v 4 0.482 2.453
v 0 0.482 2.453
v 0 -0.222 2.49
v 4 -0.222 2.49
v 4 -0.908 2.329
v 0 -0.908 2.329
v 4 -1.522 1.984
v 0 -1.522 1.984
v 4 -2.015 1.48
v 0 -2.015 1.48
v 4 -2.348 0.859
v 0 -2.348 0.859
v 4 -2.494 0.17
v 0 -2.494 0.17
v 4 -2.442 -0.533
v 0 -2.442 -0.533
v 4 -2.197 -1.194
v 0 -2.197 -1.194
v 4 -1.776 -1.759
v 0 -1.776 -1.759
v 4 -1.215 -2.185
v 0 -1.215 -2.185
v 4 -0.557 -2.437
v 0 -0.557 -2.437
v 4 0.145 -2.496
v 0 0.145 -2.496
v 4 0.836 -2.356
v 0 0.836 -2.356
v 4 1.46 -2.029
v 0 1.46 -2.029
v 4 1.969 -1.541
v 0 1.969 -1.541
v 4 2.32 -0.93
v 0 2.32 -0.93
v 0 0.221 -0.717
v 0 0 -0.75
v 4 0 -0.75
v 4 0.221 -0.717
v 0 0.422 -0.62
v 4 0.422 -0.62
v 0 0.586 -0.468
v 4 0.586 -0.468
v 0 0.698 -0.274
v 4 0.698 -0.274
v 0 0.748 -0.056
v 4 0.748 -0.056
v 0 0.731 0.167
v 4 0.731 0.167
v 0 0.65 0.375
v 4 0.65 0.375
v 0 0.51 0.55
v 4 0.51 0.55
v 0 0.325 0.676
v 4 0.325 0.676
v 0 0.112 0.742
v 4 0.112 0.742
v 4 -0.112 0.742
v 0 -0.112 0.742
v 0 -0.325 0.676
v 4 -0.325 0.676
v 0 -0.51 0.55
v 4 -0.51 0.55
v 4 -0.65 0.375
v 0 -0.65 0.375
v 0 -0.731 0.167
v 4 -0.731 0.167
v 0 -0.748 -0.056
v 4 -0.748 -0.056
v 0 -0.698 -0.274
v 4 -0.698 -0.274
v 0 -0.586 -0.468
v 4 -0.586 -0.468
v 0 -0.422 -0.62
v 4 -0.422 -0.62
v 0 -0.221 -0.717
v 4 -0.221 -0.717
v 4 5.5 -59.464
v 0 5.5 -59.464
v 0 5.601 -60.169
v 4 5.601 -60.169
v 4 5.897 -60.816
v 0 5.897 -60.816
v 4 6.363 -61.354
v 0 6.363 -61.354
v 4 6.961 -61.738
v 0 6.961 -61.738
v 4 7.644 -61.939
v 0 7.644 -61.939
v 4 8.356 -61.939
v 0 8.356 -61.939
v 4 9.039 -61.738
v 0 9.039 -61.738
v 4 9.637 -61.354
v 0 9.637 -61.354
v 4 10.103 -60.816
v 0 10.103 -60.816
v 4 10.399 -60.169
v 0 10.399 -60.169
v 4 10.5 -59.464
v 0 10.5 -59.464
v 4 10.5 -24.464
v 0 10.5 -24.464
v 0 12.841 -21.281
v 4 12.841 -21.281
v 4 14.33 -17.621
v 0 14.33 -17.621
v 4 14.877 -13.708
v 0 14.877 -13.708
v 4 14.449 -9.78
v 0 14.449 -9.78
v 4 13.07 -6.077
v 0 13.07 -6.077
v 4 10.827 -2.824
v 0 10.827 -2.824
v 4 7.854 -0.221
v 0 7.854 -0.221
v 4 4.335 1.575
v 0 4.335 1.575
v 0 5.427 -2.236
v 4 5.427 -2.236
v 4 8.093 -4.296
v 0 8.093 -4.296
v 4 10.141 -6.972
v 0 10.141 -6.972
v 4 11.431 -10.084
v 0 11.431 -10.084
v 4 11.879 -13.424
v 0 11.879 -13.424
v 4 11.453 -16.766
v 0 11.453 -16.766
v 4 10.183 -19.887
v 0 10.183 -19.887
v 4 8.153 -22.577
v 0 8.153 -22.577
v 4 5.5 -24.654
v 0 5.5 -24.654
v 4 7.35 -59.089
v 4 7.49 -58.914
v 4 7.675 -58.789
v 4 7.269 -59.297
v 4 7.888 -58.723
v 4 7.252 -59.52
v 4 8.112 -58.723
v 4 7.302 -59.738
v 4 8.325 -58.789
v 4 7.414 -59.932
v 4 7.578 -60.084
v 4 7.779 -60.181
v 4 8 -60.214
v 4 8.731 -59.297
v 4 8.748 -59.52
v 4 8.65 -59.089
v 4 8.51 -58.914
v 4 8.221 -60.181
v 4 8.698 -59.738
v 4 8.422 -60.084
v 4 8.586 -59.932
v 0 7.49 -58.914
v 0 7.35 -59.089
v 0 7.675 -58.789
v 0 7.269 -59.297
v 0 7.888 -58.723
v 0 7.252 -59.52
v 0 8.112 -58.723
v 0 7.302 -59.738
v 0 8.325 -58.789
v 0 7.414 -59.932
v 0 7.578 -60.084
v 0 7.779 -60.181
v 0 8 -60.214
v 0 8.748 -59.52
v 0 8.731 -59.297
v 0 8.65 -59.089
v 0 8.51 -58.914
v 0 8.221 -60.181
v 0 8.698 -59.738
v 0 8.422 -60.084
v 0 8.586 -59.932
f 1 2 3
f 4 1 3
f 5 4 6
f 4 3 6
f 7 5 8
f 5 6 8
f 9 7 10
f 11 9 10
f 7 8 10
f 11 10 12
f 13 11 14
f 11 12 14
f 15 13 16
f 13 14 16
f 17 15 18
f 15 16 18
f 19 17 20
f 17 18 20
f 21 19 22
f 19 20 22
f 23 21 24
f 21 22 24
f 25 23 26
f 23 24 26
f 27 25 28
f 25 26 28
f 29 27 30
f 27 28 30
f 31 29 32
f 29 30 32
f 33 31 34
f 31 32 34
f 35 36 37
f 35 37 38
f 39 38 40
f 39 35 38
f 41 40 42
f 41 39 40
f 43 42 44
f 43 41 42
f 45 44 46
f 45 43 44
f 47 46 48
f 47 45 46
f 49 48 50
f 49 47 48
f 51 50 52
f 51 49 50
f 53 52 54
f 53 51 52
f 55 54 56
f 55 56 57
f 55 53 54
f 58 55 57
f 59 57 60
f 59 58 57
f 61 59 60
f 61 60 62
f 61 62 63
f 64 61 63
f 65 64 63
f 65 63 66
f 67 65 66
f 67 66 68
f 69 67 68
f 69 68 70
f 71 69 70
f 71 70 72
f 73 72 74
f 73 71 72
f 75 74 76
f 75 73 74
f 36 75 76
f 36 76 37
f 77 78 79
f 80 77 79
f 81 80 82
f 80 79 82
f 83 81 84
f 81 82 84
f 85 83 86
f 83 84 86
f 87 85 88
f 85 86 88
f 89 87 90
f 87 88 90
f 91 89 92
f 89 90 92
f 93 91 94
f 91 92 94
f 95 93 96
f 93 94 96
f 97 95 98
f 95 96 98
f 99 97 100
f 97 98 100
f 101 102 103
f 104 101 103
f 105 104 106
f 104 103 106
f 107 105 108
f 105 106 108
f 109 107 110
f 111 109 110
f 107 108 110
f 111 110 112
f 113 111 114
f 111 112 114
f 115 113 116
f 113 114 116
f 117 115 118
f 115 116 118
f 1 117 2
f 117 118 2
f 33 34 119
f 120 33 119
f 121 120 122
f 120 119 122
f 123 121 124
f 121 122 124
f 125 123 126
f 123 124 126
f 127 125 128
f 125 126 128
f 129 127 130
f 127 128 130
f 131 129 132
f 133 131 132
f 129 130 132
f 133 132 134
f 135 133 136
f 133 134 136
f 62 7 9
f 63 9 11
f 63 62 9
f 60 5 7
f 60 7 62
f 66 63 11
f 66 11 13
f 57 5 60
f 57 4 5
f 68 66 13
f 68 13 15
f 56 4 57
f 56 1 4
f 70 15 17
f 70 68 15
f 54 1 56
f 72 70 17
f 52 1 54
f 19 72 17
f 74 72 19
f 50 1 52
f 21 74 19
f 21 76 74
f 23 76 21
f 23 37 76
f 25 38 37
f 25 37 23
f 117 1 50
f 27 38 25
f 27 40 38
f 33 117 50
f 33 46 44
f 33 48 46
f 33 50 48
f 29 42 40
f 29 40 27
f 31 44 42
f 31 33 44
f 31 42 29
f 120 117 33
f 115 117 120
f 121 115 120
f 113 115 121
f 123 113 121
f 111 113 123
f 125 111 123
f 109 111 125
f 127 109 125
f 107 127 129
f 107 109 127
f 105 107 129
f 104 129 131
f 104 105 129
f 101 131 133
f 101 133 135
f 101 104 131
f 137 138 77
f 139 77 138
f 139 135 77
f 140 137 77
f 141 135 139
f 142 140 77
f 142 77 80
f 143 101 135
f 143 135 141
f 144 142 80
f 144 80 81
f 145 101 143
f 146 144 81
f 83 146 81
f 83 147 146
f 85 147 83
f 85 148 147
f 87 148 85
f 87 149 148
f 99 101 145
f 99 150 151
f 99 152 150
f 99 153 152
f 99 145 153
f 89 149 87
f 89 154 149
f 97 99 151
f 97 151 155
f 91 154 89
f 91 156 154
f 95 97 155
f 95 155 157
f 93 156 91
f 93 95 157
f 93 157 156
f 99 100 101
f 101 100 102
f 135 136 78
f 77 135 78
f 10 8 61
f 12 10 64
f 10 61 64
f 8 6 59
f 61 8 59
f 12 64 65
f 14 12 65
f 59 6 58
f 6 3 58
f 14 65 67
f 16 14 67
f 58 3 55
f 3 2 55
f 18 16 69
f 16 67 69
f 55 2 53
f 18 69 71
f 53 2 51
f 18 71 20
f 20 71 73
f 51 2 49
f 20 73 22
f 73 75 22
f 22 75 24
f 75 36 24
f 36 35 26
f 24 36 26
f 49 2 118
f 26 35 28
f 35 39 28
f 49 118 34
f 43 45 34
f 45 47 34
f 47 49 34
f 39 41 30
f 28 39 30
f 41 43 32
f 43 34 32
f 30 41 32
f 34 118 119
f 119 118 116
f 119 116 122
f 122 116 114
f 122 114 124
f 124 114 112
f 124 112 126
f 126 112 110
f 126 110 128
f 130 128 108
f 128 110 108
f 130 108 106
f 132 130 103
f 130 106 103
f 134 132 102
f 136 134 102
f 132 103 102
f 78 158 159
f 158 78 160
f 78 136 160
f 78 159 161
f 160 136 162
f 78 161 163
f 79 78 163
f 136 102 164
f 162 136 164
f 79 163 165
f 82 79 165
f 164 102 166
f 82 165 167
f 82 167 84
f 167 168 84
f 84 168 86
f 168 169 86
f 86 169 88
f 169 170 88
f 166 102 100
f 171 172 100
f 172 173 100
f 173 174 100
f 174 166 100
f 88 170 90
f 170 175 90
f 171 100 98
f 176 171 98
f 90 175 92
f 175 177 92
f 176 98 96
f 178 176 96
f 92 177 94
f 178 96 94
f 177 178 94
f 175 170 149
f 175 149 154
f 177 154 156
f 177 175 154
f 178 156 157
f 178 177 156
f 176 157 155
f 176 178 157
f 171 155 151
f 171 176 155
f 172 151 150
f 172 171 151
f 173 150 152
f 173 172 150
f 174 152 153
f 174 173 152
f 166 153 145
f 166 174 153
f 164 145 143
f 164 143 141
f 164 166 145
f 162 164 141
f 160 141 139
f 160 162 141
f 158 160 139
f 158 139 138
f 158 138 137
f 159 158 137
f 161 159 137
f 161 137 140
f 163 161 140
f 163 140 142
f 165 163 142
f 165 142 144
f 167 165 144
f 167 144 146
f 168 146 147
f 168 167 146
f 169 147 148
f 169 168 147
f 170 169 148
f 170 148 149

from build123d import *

# Parameters (mm, degrees)
SKETCH1_R           = 0.75
BOSS_EXTRUDE1_DEPTH = 4


with BuildPart() as part:
    # Sketch1 → Boss-Extrude1 (new body)
    with BuildSketch(Plane(origin=(0, 0, 0), x_dir=(0, 0, -1), z_dir=(1, 0, 0))):
        with BuildLine():
            Line((59.464274989, 10.5), (24.464274989, 10.5))
            ThreePointArc((24.464274989, 10.5), (7.885689727, 13.874194792), (-2.453052661, 0.482216385))
            ThreePointArc((-2.453052661, 0.482216385), (1.193550555, -2.19668775), (0.930226833, 2.320490905))
            ThreePointArc((0.930226833, 2.320490905), (11.73957945, 11.763813024), (24.654031937, 5.5))
            Line((24.654031937, 5.5), (59.464274989, 5.5))
            ThreePointArc((59.464274989, 5.5), (61.964274989, 8), (59.464274989, 10.5))
        make_face()
        with Locations((59.464274989, 8)):
            Circle(SKETCH1_R, mode=Mode.SUBTRACT)
        Circle(SKETCH1_R, mode=Mode.SUBTRACT)
    extrude(amount=BOSS_EXTRUDE1_DEPTH)


solid = part.part
